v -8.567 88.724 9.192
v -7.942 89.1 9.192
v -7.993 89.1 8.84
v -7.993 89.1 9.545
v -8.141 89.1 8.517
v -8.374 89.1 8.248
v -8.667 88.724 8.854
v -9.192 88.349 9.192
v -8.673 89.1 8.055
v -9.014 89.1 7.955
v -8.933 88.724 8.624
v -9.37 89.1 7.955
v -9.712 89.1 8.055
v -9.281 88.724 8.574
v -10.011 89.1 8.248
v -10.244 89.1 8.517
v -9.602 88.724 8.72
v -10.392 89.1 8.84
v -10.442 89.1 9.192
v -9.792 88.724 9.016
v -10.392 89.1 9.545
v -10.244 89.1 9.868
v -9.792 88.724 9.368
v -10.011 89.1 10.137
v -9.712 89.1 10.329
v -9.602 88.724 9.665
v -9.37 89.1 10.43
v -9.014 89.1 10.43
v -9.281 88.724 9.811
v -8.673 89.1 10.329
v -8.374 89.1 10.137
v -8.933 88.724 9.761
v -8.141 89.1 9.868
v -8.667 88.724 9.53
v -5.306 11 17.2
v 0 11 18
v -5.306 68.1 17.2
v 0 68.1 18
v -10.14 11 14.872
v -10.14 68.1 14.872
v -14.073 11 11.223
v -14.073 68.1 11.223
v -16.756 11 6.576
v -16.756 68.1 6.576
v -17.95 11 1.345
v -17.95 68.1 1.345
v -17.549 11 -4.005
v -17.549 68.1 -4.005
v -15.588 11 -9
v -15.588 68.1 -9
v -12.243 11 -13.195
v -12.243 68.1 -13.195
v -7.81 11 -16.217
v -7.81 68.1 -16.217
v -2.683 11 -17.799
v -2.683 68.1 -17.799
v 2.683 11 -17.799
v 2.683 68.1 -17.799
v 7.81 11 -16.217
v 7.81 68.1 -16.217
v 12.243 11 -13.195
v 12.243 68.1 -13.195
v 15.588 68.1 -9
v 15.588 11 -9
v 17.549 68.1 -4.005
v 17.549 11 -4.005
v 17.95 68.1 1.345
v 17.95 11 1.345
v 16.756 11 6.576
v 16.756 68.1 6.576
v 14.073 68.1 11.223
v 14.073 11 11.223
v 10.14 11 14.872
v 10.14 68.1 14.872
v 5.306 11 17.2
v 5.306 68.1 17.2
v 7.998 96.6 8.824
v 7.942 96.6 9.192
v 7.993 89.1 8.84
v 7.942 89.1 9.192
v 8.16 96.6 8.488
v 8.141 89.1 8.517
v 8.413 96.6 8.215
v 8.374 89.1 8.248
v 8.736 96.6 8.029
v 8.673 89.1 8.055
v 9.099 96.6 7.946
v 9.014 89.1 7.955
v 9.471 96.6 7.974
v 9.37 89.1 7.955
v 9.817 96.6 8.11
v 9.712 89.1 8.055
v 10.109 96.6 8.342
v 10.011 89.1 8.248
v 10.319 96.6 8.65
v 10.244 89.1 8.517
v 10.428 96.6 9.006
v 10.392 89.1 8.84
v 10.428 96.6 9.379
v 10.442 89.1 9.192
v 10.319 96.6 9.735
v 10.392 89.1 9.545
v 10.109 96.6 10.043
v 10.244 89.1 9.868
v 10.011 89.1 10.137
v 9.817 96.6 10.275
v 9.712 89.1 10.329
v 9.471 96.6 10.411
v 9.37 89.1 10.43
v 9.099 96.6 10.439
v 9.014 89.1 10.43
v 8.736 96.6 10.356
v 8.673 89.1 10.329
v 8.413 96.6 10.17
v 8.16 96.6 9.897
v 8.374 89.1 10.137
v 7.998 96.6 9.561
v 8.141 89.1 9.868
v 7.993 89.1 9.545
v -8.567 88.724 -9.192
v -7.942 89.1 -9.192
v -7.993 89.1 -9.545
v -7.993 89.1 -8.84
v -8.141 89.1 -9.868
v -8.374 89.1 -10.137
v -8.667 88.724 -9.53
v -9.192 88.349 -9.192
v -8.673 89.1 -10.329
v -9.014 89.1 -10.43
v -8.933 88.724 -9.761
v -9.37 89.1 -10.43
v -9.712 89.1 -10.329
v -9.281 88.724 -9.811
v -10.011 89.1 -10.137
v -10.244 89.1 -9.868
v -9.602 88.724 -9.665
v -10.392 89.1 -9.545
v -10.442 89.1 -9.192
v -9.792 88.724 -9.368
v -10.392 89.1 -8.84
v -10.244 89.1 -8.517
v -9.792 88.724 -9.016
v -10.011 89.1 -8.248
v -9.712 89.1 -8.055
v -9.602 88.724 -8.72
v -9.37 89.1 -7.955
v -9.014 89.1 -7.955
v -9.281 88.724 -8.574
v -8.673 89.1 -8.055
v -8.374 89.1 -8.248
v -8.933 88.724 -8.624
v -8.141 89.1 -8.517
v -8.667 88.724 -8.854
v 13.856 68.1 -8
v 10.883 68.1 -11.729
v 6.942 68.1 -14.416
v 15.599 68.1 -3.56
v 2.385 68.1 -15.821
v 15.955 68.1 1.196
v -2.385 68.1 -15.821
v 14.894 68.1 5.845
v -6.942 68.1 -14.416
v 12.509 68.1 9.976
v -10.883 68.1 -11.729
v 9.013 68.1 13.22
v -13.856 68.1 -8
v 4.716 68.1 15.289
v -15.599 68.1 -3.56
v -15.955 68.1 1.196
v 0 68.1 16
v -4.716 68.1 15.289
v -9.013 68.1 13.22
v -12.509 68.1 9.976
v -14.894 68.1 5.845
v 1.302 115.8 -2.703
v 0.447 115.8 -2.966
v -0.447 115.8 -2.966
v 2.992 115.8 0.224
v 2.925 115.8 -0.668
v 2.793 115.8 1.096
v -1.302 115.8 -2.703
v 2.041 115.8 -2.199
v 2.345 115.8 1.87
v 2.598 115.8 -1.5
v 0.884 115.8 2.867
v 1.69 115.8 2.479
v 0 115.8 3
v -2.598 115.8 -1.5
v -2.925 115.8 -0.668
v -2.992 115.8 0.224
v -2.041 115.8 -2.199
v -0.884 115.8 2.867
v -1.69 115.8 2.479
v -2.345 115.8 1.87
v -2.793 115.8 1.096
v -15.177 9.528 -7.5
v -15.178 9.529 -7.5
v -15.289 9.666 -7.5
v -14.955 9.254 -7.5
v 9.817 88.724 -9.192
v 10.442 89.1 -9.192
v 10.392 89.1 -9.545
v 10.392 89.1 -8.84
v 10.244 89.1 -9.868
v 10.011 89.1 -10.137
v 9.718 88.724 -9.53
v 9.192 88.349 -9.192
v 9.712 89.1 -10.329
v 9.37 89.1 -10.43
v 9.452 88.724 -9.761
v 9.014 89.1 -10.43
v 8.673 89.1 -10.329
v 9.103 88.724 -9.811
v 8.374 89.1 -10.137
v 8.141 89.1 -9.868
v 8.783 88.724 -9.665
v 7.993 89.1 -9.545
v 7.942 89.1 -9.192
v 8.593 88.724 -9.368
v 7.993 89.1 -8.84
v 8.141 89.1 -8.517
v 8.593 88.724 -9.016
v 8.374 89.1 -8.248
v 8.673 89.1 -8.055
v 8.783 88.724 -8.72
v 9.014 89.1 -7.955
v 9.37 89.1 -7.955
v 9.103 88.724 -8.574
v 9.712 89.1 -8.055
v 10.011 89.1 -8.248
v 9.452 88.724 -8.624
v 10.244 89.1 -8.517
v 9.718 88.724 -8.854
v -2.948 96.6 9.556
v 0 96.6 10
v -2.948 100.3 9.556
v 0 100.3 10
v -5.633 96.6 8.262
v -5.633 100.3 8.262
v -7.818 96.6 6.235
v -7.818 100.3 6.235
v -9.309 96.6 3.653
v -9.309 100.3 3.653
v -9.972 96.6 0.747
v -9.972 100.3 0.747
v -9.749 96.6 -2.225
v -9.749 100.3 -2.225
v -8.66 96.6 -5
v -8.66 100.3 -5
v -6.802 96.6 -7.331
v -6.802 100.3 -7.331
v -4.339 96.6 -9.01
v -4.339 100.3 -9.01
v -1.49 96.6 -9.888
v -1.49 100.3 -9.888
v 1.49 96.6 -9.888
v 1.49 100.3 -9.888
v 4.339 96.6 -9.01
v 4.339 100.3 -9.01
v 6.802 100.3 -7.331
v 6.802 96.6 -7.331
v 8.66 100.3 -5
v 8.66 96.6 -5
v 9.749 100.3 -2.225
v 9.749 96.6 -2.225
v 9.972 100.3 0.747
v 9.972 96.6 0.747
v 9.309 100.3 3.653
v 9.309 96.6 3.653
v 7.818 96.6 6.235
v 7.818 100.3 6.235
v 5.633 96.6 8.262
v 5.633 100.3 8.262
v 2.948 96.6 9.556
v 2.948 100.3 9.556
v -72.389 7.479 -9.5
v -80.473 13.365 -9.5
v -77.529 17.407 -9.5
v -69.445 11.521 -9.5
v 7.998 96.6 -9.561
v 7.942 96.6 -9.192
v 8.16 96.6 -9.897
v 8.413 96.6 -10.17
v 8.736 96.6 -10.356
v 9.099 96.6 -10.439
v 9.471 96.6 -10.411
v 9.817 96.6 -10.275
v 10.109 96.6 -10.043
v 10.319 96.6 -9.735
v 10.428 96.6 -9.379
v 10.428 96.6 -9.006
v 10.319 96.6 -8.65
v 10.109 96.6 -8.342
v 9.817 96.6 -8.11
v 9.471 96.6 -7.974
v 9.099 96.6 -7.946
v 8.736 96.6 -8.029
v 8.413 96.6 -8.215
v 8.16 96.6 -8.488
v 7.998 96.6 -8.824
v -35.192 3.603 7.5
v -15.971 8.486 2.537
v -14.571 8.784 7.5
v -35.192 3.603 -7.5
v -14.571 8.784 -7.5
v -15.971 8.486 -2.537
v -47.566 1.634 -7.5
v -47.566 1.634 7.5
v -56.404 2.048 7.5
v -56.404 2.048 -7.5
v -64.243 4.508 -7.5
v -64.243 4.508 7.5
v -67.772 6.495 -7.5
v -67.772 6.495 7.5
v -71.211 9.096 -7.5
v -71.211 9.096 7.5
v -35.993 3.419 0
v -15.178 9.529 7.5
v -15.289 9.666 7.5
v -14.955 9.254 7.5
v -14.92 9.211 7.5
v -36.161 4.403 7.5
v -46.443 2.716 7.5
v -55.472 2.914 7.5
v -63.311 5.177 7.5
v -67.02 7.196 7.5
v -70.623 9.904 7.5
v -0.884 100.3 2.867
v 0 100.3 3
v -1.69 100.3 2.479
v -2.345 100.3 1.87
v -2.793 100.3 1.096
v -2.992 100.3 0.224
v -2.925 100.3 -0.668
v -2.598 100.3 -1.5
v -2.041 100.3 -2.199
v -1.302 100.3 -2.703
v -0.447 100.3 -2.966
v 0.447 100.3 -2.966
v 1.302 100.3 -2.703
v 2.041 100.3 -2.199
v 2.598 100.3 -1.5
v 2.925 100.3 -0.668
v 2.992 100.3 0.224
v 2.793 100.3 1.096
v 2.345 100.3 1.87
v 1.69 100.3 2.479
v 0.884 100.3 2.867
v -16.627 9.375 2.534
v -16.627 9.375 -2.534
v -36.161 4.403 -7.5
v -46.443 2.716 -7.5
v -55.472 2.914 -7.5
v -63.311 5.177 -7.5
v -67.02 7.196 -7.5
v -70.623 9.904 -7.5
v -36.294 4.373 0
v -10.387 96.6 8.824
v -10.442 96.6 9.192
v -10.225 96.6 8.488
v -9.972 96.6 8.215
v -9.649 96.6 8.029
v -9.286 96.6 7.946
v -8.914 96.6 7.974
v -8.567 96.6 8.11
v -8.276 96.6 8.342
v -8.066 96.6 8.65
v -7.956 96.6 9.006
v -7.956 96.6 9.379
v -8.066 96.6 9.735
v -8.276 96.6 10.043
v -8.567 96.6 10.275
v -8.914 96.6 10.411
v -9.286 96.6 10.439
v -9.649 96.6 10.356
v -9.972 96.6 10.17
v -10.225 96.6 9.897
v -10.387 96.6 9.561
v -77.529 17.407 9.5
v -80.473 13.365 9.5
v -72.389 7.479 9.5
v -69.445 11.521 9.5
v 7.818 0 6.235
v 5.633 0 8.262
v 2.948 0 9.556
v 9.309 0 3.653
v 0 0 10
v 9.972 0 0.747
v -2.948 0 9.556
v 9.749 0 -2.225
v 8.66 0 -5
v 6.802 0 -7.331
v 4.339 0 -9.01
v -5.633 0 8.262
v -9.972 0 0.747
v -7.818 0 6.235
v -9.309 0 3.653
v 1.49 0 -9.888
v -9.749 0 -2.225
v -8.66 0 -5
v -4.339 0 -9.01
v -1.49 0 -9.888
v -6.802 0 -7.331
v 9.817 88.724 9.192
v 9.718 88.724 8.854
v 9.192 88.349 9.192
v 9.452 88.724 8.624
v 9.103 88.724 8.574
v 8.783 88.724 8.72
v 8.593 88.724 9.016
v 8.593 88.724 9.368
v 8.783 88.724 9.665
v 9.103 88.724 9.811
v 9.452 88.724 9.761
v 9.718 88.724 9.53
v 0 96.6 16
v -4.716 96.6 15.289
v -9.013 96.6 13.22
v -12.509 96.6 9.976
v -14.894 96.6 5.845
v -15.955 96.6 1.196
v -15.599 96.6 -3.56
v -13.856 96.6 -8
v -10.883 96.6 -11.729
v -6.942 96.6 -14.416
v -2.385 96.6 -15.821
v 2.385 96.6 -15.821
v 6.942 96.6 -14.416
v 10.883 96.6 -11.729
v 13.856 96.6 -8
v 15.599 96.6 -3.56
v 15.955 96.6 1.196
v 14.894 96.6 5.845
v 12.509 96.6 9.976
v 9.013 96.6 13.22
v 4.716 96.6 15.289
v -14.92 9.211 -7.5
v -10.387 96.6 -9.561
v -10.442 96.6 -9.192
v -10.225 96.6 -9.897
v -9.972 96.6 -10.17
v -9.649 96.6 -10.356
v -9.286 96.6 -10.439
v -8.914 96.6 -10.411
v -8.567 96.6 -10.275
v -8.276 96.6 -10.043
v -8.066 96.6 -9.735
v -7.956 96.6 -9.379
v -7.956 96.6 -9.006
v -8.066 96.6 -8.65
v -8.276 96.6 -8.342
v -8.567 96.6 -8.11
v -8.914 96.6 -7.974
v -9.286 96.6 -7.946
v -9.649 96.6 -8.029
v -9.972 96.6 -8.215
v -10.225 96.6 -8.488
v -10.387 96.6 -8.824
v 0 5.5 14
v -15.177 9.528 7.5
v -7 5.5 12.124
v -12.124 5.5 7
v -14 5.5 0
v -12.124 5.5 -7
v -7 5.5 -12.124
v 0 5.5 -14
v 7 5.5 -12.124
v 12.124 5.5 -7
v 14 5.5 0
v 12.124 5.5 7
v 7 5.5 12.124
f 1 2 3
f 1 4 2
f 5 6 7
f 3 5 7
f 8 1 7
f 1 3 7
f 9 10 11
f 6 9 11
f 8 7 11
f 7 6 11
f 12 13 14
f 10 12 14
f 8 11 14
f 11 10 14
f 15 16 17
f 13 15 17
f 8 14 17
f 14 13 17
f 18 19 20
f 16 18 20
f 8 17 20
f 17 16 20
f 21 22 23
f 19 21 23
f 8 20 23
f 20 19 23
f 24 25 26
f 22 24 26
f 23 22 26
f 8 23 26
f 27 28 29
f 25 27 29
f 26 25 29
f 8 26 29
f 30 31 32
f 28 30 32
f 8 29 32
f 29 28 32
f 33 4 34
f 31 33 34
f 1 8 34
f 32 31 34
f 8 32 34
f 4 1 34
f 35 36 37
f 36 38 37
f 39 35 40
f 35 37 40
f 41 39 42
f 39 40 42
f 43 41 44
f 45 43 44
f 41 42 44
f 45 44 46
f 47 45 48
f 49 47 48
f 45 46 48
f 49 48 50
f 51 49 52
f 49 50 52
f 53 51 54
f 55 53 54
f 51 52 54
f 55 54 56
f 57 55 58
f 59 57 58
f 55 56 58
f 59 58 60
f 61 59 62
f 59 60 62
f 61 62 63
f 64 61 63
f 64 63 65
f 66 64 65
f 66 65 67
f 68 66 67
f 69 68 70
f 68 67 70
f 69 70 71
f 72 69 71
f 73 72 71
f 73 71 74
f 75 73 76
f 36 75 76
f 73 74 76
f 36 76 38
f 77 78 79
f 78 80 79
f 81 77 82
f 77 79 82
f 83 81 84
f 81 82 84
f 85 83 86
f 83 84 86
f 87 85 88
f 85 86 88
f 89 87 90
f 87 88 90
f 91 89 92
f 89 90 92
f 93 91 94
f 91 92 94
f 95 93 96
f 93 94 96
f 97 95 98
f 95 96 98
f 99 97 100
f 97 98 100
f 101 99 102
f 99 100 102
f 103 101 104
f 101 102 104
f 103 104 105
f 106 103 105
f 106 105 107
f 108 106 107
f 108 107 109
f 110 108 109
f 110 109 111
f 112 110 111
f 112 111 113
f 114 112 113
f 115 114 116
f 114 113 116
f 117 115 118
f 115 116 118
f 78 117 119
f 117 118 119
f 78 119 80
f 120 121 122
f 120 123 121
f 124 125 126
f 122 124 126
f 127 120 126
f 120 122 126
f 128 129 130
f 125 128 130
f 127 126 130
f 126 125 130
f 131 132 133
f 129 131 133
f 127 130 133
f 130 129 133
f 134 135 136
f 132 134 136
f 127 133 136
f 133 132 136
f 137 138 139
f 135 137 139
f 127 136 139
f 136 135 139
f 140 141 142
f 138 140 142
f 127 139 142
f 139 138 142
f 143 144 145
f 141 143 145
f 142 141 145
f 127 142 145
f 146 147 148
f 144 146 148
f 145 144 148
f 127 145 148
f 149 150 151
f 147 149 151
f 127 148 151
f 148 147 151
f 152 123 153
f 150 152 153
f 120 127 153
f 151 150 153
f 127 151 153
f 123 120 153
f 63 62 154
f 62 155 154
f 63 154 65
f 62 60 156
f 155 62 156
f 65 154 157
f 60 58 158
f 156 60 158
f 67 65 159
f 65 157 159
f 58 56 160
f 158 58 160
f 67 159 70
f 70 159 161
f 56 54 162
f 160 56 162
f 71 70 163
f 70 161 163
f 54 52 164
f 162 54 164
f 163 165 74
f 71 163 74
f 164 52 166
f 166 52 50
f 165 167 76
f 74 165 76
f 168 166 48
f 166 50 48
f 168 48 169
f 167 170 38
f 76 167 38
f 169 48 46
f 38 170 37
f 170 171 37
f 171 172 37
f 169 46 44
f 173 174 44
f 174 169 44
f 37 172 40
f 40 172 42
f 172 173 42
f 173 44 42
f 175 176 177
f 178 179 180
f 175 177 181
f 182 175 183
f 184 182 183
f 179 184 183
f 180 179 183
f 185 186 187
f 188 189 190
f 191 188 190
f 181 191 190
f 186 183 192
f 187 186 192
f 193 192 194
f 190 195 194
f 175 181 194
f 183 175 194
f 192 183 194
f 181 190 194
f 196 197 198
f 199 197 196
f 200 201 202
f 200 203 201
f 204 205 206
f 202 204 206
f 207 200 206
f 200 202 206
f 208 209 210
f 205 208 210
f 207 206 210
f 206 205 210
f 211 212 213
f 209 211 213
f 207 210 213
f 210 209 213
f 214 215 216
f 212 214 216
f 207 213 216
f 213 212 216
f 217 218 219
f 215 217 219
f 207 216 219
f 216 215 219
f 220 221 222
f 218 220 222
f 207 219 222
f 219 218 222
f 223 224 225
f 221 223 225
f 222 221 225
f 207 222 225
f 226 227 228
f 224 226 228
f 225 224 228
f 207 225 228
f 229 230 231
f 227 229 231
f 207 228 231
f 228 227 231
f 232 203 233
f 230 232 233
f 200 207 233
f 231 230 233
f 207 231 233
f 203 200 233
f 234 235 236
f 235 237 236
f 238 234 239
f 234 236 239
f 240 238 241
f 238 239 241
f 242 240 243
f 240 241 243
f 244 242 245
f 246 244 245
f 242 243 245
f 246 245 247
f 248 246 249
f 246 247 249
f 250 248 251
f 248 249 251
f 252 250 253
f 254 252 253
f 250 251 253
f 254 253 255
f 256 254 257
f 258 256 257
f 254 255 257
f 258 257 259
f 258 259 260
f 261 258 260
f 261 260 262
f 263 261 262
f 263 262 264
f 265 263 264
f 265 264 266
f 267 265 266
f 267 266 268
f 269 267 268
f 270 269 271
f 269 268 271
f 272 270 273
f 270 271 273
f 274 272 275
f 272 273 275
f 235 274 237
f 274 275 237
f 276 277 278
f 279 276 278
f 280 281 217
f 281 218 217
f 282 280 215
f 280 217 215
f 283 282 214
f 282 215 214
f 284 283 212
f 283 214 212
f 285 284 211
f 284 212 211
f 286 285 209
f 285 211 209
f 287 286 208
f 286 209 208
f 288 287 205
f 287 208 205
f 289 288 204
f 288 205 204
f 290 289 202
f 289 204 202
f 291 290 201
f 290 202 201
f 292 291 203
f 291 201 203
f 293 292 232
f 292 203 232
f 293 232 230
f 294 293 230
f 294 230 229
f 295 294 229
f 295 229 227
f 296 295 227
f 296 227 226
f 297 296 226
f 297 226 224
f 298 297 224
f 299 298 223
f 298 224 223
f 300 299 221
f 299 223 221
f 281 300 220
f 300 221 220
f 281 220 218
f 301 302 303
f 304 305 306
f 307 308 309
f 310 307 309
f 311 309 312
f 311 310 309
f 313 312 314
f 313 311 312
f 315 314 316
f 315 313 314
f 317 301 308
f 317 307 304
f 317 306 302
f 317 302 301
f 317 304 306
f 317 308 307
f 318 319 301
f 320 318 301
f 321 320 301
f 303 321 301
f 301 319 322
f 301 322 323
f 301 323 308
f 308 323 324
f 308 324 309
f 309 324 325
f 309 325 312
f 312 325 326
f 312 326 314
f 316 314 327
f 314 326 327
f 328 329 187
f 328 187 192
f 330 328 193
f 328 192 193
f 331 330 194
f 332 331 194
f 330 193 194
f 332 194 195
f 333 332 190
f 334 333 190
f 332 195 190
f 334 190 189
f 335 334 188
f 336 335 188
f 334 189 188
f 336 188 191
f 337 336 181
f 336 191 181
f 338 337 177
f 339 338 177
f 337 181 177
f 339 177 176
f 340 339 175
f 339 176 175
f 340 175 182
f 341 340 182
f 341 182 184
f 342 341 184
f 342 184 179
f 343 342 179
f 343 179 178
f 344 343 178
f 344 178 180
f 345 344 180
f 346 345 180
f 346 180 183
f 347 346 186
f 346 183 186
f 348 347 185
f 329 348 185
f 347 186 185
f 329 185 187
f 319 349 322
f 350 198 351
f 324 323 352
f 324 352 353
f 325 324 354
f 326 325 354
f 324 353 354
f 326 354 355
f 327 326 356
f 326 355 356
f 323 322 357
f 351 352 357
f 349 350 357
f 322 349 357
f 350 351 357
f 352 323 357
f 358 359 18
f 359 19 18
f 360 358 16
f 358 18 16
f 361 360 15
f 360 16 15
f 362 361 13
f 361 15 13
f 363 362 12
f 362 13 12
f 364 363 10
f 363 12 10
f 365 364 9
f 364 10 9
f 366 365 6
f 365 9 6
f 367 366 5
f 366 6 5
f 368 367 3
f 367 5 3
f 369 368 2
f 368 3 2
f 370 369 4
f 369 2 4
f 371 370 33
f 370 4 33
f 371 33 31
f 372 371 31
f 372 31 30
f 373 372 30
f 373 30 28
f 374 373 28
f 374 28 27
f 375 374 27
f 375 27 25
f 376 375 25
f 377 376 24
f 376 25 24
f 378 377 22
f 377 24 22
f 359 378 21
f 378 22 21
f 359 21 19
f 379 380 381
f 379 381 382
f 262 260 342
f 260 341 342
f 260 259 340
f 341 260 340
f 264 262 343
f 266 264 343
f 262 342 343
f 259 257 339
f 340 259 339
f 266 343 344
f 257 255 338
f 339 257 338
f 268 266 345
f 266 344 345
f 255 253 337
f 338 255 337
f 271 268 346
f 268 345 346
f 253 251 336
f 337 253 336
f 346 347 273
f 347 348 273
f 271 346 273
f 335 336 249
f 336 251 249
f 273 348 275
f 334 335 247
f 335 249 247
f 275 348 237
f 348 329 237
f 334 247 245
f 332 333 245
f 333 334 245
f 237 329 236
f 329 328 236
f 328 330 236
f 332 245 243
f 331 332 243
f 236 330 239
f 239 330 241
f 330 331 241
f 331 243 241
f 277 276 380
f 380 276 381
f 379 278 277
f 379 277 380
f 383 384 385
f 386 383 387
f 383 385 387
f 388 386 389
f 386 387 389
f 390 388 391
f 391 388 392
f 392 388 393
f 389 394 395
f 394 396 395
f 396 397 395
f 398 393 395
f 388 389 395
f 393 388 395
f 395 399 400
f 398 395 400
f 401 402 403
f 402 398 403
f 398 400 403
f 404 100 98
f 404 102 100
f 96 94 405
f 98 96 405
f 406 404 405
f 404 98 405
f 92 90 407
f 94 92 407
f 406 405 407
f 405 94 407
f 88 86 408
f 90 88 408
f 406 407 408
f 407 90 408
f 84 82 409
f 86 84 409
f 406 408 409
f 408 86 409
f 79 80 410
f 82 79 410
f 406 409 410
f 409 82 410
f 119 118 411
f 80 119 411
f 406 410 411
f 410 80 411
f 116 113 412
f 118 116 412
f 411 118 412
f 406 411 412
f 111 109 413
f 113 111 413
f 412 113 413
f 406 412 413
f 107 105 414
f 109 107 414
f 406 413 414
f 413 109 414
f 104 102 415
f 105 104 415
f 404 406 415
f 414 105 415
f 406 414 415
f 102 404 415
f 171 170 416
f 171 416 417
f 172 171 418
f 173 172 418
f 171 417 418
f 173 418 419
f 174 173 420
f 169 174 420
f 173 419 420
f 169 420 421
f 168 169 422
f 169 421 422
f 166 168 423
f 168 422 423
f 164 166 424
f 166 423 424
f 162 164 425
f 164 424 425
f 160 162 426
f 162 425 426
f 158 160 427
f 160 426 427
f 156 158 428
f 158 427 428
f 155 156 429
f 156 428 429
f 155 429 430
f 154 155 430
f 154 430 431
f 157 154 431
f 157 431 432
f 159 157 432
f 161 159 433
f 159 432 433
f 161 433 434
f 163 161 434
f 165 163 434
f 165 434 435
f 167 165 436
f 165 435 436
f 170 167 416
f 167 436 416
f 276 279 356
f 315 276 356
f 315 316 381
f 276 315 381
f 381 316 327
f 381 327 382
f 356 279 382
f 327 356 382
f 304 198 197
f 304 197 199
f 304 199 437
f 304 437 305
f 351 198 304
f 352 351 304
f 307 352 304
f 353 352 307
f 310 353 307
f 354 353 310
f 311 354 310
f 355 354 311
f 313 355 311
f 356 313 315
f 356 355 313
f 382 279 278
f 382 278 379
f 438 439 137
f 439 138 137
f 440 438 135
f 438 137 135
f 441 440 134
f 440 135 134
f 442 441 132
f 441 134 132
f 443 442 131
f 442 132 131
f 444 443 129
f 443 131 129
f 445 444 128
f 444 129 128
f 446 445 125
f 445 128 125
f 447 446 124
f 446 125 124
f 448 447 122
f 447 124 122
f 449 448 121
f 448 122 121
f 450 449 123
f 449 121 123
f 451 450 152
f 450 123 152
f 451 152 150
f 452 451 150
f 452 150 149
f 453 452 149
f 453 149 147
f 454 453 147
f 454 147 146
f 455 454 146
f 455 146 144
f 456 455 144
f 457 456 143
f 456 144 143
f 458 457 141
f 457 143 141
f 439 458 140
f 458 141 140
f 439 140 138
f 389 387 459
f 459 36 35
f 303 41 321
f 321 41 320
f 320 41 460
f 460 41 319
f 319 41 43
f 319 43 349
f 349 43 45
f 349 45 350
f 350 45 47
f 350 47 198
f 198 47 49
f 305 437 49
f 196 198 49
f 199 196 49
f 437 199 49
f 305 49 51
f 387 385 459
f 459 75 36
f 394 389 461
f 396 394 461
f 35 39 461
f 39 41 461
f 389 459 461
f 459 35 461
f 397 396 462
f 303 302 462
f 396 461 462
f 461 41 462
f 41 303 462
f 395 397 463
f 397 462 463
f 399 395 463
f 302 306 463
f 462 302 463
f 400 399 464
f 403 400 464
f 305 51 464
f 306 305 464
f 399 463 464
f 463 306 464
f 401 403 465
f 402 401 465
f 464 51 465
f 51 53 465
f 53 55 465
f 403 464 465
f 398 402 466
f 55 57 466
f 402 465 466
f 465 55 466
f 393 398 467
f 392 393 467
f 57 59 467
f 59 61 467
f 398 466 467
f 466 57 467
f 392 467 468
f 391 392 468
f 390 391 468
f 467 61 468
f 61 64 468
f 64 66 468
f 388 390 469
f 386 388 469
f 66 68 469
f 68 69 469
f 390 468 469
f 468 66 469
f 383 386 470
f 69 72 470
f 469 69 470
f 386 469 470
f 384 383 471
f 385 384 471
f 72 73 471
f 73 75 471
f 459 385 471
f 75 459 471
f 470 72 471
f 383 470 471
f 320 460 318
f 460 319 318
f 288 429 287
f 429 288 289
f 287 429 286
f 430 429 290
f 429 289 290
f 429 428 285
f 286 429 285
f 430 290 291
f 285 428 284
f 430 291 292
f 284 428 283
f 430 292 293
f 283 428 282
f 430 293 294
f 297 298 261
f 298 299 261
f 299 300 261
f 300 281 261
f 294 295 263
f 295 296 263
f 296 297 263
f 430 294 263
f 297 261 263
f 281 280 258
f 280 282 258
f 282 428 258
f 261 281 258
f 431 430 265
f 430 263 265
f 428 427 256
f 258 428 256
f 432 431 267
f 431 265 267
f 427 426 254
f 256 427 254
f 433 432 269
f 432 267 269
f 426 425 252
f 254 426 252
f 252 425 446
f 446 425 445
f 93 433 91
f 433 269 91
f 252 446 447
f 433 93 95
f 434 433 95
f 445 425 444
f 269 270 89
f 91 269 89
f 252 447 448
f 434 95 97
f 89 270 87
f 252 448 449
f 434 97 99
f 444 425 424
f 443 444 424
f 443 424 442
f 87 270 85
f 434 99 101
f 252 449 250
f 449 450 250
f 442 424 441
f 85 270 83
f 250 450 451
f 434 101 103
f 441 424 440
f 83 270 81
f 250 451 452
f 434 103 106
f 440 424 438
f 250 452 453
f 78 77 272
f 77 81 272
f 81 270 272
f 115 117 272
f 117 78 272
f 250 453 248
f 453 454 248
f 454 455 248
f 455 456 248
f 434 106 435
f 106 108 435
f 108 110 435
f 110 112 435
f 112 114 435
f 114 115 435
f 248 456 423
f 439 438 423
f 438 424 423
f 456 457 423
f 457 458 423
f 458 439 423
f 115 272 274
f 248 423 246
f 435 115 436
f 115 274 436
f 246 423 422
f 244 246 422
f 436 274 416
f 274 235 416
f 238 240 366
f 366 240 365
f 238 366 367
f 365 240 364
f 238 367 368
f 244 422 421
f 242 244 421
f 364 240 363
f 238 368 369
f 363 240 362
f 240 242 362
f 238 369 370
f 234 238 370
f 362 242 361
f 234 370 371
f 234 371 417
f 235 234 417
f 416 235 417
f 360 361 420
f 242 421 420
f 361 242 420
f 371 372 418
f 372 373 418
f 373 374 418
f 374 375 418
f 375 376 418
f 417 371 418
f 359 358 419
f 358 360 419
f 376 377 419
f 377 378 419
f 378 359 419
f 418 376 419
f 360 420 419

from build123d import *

# Parameters (mm, degrees)
SWEEP1_START              = -7.5
SWEEP1_DEPTH              = 15
SKETCH4_W                 = 19
SKETCH4_H                 = 5
BOSS_EXTRUDE1_DEPTH       = 10
M3X0_5_TAPPED_HOLE1_D     = 2.5
M3X0_5_TAPPED_HOLE1_DEPTH = 7.5
M3X0_5_TAPPED_HOLE1_TIP   = 0.751075774


with BuildPart() as part:
    # Sketch1 → Revolve1 (revolve)
    with BuildSketch(Plane.XY, mode=Mode.PRIVATE) as revolve1_sk:
        Polygon((0, 0), (-10, 0), (-18, 11), (-18, 68.1), (-16, 68.1), (-16, 96.6), (-10, 96.6), (-10, 100.3), (-3, 100.3), (-3, 115.8), (0, 115.8), align=None)
    revolve(revolve1_sk.sketch.rotate(Axis((0, 115.8, 0), (0, -1, 0)), 270), axis=Axis((0, 115.8, 0), (0, -1, 0)))

    # Sweep1: read off the stored shape, not the designer's step
    # Sweep1 outline → Sweep1 (add)
    with BuildSketch(Plane.XY.offset(SWEEP1_START)):
        with BuildLine():
            add(Edge.make_bspline(
                [(-15.28930073, 9.665917189), (-15.155241069, 9.50042506), (-15.020974619, 9.335100438), (-14.781588664, 9.041143621), (-14.67655559, 8.912441119), (-14.571379426, 8.783855646)],
                knots=[17.713260558, 17.713260558, 17.713260558, 17.713260558, 18.352193294, 18.352193294, 18.850555217, 18.850555217, 18.850555217, 18.850555217], degree=3))
            add(Edge.make_bspline(
                [(-15.28930073, 9.665917189), (-22.240343975, 8.202614741), (-29.318460029, 5.946043988), (-48.487680613, 1.623066579), (-60.300160331, 0.950060594), (-70.622683773, 9.904196742)],
                knots=[0.213963068, 0.213963068, 0.213963068, 0.213963068, 0.5, 0.5, 1, 1, 1, 1], degree=3))
            Line((-70.622683773, 9.904196742), (-71.211326259, 9.095803258))
            add(Edge.make_bspline(
                [(-14.571379426, 8.783855646), (-21.586501057, 7.343246642), (-28.814104178, 5.043485332), (-48.284336953, 0.638583113), (-60.500298128, -0.149792653), (-71.211326259, 9.095803258)],
                knots=[0.207983451, 0.207983451, 0.207983451, 0.207983451, 0.5, 0.5, 1, 1, 1, 1], degree=3))
        make_face()
    extrude(amount=SWEEP1_DEPTH)

    # Sketch4 → Boss-Extrude1 (add)
    with BuildSketch(Plane(origin=(-50.864884567, 37.037943446, 0), x_dir=(0, 0, 1), z_dir=(-0.8083934830959073, 0.5886424861391397, 0))):
        with Locations((0, -34.065024053)):
            Rectangle(SKETCH4_W, SKETCH4_H)
    extrude(amount=BOSS_EXTRUDE1_DEPTH)

    # M3x0.5 Tapped Hole1
    with Locations(Plane(origin=(0, 96.6, 0), x_dir=(1, 0, 0), z_dir=(0, 1, 0))):
        with Locations((9.192388155, 9.192388155), (9.192388155, -9.192388155), (-9.192388155, -9.192388155), (-9.192388155, 9.192388155)):
            Hole(M3X0_5_TAPPED_HOLE1_D / 2, depth=M3X0_5_TAPPED_HOLE1_DEPTH)
            with Locations((0, 0, -(M3X0_5_TAPPED_HOLE1_DEPTH + M3X0_5_TAPPED_HOLE1_TIP / 2))):  # 118° drill point
                Cone(0, M3X0_5_TAPPED_HOLE1_D / 2, M3X0_5_TAPPED_HOLE1_TIP, mode=Mode.SUBTRACT)


solid = part.part
